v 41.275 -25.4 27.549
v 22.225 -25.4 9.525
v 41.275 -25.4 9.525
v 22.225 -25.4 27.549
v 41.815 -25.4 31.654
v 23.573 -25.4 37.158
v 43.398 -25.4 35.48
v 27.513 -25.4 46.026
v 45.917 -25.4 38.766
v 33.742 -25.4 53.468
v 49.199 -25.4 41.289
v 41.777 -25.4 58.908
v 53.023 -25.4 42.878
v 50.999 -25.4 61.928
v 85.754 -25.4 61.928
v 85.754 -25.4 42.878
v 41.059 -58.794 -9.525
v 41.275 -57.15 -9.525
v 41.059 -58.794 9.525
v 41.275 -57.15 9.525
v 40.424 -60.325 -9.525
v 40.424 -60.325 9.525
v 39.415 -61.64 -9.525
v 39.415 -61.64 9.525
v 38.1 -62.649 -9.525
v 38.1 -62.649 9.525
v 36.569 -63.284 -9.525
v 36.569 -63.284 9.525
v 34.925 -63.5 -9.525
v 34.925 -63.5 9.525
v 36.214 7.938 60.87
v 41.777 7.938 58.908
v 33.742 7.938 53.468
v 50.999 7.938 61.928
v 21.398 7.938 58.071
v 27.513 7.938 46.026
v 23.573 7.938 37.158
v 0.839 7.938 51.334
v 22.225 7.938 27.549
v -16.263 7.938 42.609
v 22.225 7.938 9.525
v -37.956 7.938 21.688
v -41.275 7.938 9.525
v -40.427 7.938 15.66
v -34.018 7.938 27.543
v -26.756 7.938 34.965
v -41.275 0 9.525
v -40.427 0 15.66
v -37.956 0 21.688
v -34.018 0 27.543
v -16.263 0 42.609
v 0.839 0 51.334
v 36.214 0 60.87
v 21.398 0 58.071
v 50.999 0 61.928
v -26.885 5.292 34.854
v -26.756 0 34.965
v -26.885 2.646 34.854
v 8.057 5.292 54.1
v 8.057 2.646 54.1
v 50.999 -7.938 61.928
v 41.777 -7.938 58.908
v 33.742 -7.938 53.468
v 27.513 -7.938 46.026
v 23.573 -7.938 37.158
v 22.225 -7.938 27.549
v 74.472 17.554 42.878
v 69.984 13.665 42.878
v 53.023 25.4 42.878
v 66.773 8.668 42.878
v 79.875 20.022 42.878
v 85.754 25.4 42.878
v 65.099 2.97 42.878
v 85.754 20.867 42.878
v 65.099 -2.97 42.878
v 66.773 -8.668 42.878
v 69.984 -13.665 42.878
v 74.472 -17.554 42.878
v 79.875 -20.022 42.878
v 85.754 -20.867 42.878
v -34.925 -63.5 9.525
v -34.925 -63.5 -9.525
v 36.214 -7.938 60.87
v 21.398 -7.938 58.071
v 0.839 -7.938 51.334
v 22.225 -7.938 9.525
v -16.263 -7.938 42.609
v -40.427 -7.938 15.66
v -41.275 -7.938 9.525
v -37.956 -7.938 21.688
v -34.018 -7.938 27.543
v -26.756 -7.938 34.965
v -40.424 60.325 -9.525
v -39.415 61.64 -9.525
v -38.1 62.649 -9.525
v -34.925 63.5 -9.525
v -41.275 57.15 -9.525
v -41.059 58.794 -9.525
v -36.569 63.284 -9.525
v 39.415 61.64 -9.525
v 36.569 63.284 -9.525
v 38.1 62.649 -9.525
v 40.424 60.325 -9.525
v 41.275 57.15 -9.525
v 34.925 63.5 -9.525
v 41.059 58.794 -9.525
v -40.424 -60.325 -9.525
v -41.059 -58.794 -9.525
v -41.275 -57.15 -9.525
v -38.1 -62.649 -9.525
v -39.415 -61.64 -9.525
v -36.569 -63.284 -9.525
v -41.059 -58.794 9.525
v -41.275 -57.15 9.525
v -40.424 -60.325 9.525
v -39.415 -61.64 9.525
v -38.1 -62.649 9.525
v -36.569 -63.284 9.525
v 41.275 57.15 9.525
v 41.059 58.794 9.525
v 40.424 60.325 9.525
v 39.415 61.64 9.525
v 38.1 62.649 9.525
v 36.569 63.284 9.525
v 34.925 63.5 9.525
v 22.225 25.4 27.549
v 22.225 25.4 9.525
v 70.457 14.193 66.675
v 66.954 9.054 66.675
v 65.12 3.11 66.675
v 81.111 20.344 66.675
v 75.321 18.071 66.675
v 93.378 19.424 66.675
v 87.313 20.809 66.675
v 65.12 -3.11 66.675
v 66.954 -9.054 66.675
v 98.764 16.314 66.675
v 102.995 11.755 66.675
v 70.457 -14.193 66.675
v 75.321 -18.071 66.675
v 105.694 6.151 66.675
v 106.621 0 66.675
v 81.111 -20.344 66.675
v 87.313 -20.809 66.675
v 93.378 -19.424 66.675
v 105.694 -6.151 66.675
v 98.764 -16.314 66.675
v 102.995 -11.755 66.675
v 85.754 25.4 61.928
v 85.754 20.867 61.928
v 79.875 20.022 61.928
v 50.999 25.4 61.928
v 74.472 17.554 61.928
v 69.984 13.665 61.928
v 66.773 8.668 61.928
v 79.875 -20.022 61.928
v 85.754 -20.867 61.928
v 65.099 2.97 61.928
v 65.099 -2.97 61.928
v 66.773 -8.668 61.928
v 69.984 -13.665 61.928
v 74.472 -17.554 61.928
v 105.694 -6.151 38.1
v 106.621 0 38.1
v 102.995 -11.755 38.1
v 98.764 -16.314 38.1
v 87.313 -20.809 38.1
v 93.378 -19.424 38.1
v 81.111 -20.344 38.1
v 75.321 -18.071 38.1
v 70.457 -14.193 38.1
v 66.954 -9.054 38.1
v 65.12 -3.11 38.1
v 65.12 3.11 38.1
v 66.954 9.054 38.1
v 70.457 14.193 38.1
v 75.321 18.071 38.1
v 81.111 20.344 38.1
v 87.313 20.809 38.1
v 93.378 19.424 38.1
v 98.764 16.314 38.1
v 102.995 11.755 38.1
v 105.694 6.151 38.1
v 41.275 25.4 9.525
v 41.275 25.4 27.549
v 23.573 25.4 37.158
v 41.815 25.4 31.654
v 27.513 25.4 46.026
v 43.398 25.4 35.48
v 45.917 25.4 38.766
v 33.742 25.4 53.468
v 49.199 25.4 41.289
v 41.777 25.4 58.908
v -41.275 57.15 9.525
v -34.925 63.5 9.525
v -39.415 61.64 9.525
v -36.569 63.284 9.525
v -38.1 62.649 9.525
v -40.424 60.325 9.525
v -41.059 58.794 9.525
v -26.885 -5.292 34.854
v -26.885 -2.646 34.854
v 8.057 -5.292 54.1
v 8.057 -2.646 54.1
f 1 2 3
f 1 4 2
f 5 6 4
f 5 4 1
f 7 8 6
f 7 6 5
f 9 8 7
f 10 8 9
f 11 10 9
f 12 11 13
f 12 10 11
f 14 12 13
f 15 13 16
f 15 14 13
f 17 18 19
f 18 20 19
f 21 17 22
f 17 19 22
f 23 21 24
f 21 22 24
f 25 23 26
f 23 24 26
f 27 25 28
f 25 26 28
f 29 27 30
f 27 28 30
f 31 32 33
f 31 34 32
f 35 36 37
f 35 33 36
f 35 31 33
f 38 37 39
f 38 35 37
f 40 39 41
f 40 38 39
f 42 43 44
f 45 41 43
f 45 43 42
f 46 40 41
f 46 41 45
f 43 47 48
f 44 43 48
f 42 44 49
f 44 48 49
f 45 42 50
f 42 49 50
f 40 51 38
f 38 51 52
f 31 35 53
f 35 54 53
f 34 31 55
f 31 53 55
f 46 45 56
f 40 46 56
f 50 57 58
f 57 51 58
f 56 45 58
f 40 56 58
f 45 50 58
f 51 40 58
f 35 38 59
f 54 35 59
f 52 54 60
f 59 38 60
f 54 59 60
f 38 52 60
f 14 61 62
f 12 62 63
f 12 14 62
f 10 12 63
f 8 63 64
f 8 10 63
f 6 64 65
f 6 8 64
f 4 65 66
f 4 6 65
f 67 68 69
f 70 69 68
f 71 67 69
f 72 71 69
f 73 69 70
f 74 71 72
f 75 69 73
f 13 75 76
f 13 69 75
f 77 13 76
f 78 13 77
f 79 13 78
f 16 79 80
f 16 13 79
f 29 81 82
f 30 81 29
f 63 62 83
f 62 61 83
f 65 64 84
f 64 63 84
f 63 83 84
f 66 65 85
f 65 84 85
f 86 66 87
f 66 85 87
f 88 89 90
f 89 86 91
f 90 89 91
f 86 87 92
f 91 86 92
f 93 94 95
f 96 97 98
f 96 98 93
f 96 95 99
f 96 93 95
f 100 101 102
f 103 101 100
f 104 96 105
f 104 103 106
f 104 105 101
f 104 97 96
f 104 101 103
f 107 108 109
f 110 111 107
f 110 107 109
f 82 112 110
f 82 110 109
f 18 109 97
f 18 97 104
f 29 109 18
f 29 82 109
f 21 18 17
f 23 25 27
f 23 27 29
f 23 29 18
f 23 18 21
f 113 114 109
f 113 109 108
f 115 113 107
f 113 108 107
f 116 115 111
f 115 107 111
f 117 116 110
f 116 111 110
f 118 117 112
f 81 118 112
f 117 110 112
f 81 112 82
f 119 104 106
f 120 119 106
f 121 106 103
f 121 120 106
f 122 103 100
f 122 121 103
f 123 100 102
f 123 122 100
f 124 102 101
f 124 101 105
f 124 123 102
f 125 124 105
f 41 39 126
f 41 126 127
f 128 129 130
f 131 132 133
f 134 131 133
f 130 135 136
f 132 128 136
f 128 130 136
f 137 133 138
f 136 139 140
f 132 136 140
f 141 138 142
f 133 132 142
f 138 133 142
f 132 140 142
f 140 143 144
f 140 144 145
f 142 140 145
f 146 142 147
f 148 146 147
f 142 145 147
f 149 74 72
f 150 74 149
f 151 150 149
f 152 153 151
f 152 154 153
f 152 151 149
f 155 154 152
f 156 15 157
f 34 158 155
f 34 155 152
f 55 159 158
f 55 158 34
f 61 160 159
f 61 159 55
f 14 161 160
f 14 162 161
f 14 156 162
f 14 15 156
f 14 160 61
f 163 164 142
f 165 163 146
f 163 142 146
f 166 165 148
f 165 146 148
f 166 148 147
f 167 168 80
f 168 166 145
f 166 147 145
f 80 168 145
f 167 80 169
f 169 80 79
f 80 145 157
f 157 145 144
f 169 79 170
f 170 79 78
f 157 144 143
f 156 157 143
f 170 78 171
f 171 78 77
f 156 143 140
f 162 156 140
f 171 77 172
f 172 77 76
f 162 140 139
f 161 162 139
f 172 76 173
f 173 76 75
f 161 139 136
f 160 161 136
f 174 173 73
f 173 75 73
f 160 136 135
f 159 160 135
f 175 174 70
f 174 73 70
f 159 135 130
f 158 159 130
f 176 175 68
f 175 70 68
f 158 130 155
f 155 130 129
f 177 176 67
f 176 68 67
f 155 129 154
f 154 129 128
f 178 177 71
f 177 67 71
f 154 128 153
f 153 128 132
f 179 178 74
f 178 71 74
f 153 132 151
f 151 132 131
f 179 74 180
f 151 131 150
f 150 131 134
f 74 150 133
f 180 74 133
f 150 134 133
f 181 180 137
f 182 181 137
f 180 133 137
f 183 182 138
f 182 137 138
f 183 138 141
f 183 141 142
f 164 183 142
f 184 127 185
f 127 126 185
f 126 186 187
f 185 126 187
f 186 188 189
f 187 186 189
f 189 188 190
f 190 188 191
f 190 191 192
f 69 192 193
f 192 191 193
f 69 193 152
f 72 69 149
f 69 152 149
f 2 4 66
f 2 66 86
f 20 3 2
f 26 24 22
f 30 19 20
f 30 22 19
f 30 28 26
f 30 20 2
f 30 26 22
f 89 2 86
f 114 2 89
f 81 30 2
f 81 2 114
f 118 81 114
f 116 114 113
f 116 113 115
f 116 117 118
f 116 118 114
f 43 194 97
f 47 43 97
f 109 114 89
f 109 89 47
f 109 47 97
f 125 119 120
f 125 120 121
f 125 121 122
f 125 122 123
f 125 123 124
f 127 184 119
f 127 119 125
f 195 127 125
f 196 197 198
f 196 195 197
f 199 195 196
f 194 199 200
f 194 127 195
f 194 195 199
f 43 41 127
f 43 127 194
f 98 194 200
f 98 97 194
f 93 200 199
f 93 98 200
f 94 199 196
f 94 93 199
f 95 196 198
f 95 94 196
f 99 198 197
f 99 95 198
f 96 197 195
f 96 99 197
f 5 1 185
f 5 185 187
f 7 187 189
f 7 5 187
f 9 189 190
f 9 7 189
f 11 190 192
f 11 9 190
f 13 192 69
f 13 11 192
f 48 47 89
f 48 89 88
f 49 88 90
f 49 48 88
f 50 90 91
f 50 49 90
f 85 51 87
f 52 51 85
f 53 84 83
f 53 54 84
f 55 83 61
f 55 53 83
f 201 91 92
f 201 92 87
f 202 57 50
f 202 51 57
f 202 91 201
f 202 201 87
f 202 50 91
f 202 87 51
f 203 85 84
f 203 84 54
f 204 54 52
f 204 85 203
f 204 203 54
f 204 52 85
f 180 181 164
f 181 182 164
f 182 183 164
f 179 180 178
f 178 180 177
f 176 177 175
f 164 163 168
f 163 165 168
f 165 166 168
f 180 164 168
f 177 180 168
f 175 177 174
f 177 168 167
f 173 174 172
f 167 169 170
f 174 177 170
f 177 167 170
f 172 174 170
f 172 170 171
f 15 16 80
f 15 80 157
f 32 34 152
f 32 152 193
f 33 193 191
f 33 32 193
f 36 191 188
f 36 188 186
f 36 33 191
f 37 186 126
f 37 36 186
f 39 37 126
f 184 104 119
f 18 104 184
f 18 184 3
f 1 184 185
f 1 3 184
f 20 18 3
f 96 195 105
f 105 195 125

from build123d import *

# Parameters (mm, degrees)
F1_DEPTH = 63.5
F0_W     = 29.9330746515
F0_H     = 19.05
F2_DEPTH = 25.4
F3_DEPTH = 7.9375
F5_R     = 6.35


# Not quite as in the source:
# - the program builds the solid bodies; features that only make, move or delete a surface that nothing else refers to are left out


with BuildPart() as f1:
    # F0 (on Front) → F1 (new body, symmetric)
    with BuildSketch(Plane.XZ):
        Polygon((-41.275, 9.525), (-41.275, -9.525), (41.275, -9.525), (41.275, 9.525), (22.225, 9.525), align=None)
    extrude(amount=F1_DEPTH, both=True)

    # F0 (on Front) → F2 (join, symmetric)
    with BuildSketch(Plane.XZ):
        with BuildLine():
            Line((22.225, 9.525), (41.275, 9.525))
            Line((41.275, 9.525), (41.275, 27.5486753512))
            ThreePointArc((41.275, 27.5486753512), (44.5496824671, 37.2051562356), (53.0227320404, 42.8777746134))
            Line((53.0227320404, 42.8777746134), (55.8209344745, 42.8777746134))
            Line((55.8209344745, 42.8777746134), (55.8209344745, 61.9277746134))
            Line((55.8209344745, 61.9277746134), (50.9991334821, 61.9277746134))
            ThreePointArc((50.9991334821, 61.9277746134), (30.3677797958, 49.9644801757), (22.225, 27.5486753512))
            Line((22.225, 27.5486753512), (22.225, 9.525))
        make_face()
        with Locations((70.7874718002, 52.4027746134)):
            Rectangle(F0_W, F0_H)
    extrude(amount=F2_DEPTH, both=True)

    # F0 (on Front) → F3 (join, symmetric)
    with BuildSketch(Plane.XZ):
        with BuildLine():
            add(Edge.make_bspline(
                [(-41.275, 9.525), (-41.3442589343, 36.1172966659), (8.2413451746, 61.5874938667), (50.9991334821, 61.9277746134)],
                knots=[0, 0, 0, 0, 106.1158164321, 106.1158164321, 106.1158164321, 106.1158164321], degree=3))
            Line((-41.275, 9.525), (22.225, 9.525))
            Line((22.225, 9.525), (22.225, 27.5486753512))
            ThreePointArc((22.225, 27.5486753512), (30.3677797958, 49.9644801757), (50.9991334821, 61.9277746134))
        make_face()
    extrude(amount=F3_DEPTH, both=True)

    # F0 (on Front) → F4 (revolve)
    with BuildSketch(Plane.XZ):
        Polygon((85.754009126, 66.675), (85.754009126, 61.9277746134), (85.754009126, 42.8777746134), (85.754009126, 38.1), (106.6209344745, 38.1), (106.6209344745, 66.675), align=None)
    revolve(axis=Axis((85.754009126, 0, 52.3875), (0, 0, -1)))

    # F5
    f5_edges = [f1.edges().sort_by_distance(p)[0] for p in [
        (-41.275, -63.5, 0),
        (41.275, -63.5, 0),
        (-41.275, 63.5, 0),
        (41.275, 63.5, 0),
    ]]
    fillet(f5_edges, radius=F5_R)


solid = f1.part
